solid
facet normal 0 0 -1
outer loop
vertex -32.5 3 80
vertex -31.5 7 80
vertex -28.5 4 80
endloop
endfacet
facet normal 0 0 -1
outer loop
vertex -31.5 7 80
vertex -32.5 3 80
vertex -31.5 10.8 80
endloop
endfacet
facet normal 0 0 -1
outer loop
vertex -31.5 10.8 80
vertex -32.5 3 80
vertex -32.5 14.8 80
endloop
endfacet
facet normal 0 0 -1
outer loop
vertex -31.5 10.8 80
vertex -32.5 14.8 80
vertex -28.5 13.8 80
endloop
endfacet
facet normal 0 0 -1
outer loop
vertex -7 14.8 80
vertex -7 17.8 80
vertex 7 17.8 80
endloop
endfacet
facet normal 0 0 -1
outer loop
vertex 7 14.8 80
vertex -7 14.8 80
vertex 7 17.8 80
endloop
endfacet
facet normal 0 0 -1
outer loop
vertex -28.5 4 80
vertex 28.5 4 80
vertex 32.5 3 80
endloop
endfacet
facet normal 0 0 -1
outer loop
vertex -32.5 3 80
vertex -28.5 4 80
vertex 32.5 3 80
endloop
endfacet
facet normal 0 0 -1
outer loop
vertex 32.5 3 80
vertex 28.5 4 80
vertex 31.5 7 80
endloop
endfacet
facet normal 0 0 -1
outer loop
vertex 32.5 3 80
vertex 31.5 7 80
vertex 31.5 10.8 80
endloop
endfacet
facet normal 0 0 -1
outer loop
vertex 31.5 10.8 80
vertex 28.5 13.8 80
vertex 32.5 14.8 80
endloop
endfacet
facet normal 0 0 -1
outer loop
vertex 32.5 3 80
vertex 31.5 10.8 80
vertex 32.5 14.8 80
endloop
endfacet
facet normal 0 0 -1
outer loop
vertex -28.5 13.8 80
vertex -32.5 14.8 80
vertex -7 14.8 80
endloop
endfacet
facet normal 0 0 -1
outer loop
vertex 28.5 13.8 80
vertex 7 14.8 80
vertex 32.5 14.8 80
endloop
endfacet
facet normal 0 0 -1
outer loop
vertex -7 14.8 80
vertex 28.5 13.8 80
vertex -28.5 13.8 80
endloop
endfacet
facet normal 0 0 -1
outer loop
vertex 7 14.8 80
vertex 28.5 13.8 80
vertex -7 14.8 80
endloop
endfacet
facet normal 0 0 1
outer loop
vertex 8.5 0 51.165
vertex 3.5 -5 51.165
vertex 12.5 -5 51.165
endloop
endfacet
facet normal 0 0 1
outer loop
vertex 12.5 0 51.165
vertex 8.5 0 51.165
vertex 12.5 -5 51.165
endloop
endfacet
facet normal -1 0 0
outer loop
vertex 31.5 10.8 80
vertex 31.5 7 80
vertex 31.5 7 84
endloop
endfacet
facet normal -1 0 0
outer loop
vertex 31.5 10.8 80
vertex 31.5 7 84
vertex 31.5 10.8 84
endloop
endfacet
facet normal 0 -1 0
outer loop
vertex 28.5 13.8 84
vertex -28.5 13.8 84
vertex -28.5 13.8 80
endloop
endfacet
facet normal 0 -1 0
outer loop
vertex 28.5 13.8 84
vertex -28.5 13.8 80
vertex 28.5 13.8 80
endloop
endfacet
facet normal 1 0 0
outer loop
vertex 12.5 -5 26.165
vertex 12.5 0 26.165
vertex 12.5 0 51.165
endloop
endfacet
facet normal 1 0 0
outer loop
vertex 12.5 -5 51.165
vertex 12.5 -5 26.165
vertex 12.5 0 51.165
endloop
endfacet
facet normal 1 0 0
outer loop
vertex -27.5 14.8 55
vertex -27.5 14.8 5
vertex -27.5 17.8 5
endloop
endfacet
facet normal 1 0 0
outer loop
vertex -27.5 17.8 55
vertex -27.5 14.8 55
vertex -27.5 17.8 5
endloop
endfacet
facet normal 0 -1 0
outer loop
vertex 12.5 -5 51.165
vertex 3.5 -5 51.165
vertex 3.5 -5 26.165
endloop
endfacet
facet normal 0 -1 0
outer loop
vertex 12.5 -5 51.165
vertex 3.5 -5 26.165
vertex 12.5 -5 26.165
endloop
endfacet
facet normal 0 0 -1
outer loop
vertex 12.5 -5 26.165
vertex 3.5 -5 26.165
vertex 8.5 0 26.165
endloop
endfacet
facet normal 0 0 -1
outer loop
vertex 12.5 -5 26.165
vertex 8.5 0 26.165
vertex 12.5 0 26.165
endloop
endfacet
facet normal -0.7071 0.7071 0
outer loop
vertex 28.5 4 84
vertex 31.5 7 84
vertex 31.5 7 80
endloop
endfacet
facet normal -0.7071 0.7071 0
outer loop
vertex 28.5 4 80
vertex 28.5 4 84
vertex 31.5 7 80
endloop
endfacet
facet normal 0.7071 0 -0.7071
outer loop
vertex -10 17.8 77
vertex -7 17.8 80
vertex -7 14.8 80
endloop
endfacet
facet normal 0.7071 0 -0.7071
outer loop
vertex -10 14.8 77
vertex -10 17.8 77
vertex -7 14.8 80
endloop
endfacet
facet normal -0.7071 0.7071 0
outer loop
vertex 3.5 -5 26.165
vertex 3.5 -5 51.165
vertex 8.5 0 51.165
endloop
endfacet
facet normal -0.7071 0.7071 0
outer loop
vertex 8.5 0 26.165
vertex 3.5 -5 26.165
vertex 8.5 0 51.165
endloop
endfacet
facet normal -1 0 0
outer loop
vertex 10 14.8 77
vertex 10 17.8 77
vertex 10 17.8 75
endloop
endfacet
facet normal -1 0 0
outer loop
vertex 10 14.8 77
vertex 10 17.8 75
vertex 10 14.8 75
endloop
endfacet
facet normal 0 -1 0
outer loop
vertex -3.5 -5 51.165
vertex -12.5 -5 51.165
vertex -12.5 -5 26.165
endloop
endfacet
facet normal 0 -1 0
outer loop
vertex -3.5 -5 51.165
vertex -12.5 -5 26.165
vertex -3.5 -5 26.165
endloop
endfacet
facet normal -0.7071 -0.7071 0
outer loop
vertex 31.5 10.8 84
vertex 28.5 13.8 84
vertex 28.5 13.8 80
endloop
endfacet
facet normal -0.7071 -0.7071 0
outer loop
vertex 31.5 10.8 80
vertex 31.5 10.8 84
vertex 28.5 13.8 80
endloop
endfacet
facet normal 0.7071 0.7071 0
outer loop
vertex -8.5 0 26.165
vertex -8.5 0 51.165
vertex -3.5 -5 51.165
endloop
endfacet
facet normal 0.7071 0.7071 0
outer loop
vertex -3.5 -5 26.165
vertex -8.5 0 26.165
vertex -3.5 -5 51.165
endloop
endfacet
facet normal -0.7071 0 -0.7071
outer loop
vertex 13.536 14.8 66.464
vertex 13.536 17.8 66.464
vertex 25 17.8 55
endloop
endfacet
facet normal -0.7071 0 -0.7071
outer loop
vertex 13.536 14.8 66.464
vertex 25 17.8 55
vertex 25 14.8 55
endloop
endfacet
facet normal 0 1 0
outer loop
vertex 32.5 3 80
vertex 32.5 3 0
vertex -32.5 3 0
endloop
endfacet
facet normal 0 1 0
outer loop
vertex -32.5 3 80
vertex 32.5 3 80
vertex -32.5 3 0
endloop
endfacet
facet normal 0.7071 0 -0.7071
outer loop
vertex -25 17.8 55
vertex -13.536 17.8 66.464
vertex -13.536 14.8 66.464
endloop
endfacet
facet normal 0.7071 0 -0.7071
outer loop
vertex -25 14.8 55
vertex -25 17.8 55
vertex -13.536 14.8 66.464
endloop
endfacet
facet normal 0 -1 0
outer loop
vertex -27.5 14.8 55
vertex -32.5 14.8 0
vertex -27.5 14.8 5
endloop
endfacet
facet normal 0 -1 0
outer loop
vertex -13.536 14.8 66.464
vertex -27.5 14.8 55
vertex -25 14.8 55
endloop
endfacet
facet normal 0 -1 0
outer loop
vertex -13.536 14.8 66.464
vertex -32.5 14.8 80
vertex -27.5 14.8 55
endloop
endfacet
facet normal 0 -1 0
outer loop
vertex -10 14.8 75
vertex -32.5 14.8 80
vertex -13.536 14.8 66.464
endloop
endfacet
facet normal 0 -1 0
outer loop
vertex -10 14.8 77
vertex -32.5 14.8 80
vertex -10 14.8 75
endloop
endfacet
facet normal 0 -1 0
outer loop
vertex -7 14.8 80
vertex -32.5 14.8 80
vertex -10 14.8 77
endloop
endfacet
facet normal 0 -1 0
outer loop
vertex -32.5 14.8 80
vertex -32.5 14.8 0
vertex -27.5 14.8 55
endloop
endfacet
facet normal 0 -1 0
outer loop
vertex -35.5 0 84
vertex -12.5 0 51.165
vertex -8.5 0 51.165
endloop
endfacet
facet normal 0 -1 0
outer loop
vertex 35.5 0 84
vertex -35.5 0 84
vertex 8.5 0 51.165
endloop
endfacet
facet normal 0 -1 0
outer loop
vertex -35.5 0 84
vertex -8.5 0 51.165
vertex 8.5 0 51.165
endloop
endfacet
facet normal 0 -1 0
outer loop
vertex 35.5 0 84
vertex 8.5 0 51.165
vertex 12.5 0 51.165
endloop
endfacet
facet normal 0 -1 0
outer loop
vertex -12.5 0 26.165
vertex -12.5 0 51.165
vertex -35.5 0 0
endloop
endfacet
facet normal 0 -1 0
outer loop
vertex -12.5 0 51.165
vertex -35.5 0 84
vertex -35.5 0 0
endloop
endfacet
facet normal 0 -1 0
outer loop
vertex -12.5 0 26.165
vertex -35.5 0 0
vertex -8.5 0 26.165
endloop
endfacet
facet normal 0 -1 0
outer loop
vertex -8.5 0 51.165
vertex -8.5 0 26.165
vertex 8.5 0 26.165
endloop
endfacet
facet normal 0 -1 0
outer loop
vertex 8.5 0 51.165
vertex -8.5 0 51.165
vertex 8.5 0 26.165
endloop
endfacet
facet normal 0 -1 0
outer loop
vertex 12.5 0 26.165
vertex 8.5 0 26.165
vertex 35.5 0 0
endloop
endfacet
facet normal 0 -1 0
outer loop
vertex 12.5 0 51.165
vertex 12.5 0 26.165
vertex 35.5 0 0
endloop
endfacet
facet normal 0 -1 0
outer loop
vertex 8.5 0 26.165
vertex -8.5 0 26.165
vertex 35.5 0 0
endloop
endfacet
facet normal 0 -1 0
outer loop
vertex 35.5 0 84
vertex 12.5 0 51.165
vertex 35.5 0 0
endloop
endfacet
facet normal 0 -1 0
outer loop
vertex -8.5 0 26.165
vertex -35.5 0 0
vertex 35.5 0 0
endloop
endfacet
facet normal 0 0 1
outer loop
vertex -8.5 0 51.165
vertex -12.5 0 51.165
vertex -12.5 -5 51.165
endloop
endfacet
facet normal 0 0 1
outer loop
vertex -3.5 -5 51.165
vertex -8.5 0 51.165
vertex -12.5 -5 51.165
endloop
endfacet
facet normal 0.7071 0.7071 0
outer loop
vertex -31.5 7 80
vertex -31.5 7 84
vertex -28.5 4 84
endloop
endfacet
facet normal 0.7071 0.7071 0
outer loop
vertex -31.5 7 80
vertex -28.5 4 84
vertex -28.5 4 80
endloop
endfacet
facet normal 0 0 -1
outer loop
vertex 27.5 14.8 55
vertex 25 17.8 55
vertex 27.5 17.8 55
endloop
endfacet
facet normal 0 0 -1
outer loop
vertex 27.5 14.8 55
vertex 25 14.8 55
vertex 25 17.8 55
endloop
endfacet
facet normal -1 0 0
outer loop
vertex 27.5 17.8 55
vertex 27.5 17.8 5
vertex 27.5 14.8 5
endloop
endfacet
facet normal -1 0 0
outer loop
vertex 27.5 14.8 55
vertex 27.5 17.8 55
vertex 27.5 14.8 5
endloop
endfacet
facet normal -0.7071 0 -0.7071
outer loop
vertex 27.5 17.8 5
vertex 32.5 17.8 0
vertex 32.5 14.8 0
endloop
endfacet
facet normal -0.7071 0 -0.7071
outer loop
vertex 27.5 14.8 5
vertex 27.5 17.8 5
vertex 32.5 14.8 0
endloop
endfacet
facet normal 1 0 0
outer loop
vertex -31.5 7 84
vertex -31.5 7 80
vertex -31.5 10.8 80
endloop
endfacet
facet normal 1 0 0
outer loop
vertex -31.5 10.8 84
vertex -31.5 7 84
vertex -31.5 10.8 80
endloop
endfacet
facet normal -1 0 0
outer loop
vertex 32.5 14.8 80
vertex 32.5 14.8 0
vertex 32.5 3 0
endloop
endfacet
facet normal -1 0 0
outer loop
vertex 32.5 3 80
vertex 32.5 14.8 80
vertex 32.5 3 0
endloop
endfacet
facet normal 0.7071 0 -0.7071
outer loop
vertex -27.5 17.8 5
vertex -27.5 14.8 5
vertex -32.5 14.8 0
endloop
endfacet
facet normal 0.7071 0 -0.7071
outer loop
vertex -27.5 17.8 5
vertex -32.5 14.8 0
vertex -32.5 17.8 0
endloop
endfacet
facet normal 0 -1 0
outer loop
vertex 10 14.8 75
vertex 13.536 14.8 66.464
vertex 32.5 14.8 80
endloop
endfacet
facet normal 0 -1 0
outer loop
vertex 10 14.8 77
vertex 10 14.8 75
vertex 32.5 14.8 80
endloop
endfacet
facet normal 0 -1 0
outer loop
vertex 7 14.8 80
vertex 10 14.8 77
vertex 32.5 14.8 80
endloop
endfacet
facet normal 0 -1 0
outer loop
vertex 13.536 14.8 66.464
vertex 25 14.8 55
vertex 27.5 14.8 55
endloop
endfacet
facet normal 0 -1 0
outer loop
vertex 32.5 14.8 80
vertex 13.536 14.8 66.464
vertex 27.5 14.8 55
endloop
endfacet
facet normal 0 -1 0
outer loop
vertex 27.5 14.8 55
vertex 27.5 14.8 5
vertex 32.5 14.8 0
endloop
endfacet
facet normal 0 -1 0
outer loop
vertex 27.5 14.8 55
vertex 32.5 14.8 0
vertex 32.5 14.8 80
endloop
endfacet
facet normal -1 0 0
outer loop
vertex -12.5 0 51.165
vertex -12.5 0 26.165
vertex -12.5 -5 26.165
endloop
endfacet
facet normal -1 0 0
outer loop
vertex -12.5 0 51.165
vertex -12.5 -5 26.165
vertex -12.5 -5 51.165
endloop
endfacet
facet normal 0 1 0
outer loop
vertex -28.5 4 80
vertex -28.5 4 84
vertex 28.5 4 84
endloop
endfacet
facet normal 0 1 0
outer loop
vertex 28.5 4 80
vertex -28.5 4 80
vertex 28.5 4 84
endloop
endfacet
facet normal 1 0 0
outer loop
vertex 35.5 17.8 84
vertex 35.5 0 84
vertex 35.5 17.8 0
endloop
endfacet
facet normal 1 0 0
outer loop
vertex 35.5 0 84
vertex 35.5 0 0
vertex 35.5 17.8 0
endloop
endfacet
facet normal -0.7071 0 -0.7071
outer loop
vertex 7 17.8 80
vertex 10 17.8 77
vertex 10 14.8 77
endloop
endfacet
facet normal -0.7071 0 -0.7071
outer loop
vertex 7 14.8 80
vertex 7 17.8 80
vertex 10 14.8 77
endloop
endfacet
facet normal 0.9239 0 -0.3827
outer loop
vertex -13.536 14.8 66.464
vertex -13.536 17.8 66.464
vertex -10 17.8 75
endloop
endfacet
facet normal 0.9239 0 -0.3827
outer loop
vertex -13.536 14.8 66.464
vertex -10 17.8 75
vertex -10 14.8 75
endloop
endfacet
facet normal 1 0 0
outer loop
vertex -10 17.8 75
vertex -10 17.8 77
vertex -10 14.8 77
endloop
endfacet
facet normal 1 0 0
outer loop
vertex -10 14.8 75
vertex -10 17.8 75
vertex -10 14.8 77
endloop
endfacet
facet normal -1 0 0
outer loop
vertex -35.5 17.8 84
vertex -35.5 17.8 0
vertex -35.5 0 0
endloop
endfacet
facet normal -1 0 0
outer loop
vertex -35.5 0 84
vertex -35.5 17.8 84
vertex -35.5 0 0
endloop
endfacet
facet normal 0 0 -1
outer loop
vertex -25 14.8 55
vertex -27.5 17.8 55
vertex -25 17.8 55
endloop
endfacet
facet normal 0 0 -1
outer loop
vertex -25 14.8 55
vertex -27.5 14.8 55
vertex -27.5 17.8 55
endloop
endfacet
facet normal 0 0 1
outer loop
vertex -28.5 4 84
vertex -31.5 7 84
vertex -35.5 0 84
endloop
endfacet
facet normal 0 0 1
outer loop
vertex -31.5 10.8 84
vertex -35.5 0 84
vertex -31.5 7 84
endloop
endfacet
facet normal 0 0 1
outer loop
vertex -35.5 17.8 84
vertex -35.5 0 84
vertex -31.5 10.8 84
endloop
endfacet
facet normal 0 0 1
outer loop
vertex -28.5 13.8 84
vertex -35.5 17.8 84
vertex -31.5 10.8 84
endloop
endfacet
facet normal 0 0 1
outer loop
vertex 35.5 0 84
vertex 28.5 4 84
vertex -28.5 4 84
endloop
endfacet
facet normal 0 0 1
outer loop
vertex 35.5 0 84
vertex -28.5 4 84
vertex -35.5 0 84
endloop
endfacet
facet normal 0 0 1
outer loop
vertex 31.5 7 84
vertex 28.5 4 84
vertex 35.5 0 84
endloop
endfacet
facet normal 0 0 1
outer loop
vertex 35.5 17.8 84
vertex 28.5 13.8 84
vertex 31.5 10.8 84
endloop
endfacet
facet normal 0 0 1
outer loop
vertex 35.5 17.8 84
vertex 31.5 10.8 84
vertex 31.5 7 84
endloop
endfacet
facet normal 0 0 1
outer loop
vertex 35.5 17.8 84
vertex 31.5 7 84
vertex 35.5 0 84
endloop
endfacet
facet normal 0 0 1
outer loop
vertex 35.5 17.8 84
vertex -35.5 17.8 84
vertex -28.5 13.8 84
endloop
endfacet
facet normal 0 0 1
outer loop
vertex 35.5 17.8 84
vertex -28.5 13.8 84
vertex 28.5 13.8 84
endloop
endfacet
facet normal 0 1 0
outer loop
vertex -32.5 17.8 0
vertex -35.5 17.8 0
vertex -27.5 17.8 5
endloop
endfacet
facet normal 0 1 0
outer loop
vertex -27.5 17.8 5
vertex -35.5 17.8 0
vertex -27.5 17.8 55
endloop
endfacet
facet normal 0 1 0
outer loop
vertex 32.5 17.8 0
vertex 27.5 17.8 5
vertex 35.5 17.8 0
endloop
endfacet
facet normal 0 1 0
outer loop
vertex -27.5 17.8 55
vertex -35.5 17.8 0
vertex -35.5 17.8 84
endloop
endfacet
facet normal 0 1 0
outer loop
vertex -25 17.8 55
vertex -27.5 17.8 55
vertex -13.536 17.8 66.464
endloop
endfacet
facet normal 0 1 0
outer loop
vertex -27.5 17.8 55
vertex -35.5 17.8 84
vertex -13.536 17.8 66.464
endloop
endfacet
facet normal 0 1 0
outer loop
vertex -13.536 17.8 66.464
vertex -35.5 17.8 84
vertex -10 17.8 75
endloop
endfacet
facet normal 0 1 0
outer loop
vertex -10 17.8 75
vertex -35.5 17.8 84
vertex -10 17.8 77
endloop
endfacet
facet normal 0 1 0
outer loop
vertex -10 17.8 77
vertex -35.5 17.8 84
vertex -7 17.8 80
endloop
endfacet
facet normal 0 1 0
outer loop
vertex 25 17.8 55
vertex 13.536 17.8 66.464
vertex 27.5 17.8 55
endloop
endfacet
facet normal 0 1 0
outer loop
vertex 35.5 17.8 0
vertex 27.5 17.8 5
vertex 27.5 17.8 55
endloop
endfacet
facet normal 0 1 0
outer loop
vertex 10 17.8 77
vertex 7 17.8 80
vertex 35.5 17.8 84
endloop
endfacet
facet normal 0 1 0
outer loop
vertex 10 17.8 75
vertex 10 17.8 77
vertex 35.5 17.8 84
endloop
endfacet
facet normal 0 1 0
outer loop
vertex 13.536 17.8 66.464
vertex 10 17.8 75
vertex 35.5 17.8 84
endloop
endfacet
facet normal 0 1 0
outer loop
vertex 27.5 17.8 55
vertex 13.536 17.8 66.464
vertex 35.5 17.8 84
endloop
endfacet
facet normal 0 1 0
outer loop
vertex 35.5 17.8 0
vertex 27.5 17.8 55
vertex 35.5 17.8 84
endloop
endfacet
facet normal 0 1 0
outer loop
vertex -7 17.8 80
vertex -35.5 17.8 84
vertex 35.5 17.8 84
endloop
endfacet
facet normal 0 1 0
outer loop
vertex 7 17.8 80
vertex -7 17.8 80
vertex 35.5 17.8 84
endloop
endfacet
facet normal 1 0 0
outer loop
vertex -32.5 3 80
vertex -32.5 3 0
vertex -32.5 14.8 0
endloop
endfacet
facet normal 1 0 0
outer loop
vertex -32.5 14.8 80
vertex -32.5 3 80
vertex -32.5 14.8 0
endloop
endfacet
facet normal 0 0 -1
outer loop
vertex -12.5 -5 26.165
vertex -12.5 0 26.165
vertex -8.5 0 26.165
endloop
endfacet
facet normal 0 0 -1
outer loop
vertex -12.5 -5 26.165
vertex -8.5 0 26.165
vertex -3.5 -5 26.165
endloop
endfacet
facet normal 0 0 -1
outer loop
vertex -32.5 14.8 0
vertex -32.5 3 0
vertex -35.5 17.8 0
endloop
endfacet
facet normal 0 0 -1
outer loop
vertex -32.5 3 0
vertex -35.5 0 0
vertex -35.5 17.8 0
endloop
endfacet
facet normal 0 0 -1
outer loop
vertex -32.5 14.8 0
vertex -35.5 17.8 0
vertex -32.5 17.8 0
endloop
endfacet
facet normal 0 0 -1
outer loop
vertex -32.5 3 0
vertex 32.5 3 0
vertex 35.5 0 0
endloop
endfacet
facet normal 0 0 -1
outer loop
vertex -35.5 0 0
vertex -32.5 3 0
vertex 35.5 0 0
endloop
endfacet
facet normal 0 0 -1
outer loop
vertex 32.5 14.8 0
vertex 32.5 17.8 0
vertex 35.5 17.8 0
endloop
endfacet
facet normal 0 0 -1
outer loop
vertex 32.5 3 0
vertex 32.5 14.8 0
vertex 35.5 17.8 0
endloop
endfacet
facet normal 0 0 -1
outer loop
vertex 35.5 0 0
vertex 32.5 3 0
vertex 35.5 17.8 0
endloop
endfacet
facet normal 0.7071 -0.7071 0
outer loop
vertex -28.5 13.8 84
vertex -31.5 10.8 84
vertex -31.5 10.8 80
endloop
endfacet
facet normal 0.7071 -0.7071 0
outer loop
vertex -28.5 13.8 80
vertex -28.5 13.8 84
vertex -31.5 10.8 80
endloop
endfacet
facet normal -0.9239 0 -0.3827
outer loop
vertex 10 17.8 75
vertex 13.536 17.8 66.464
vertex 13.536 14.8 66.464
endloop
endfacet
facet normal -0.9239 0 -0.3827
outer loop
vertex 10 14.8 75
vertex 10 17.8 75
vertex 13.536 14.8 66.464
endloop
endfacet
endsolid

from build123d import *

# Parameters (mm, degrees)
F0_W      = 32.5
F0_H      = 3
F1_DEPTH  = 80
F3_DEPTH  = 4
F4_W      = 17.5
F4_H      = 3
F5_DEPTH  = 25
F6_SIZE   = 15
F7_SIZE   = 5
F8_W      = 62.9999996811
F8_H      = 9.7999996811
F9_DEPTH  = 4
F10_SIZE  = 3
F11_SIZE  = 5
F12_W     = 25
F12_H     = 25
F13_DEPTH = 5
F15_DEPTH = 25


with BuildPart() as f1:
    # F0 (on Top) → F1 (new body)
    with BuildSketch(Plane.XY):
        Polygon((-35.5, 0), (-32.5, 0), (-32.5, 3), (-32.5, 14.8), (-35.5, 14.8), align=None)
        Polygon((32.5, 3), (32.5, 0), (35.5, 0), (35.5, 14.8), (32.5, 14.8), align=None)
        with Locations((-16.25, 1.5)):
            Rectangle(F0_W, F0_H)
        with Locations((16.25, 1.5)):
            Rectangle(F0_W, F0_H)
        Polygon((-35.5, 14.8), (-32.5, 14.8), (-27.5, 14.8), (-27.5, 17.8), (-35.5, 17.8), align=None)
        Polygon((27.5, 14.8), (32.5, 14.8), (35.5, 14.8), (35.5, 17.8), (27.5, 17.8), align=None)
    extrude(amount=F1_DEPTH)

    # F2 (on face) → F3 (join)
    with BuildSketch(Plane.XY.offset(80)):
        Polygon((27.5, 17.8), (-27.5, 17.8), (-27.5, 14.8), (-32.5, 14.8), (-32.5, 3), (32.5, 3), (32.5, 14.8), (27.5, 14.8), align=None)
        Polygon((-27.5, 17.8), (-35.5, 17.8), (-35.5, 0), (35.5, 0), (35.5, 17.8), (27.5, 17.8), (27.5, 14.8), (32.5, 14.8), (32.5, 3), (-32.5, 3), (-32.5, 14.8), (-27.5, 14.8), align=None)
    extrude(amount=F3_DEPTH)

    # F4 (on face) → F5 (join)
    with BuildSketch(Plane(origin=(0, 0, 80), x_dir=(1, 0, 0), z_dir=(0, 0, -1))):
        with Locations((-18.75, -16.3)):
            Rectangle(F4_W, F4_H)
        with Locations((18.75, -16.3)):
            Rectangle(F4_W, F4_H)
    extrude(amount=F5_DEPTH)

    # F6
    f6_edges = [f1.edges().sort_by_distance(p)[0] for p in [
        (-10, 16.3, 55),
        (10, 16.3, 55),
    ]]
    chamfer(f6_edges, length=F6_SIZE)

    # F7
    f7_edges = [f1.edges().sort_by_distance(p)[0] for p in [
        (-10, 16.3, 70),
        (10, 16.3, 70),
    ]]
    chamfer(f7_edges, length=F7_SIZE)

    # F8 (on face) → F9 (cut)
    with BuildSketch(Plane.XY.offset(84)):
        with Locations((0, 8.9)):
            Rectangle(F8_W, F8_H)
    extrude(amount=-F9_DEPTH, mode=Mode.SUBTRACT)

    # F10
    f10_edges = [f1.edges().sort_by_distance(p)[0] for p in [
        (-31.5, 13.8, 82),
        (-31.5, 4, 82),
        (31.5, 4, 82),
        (31.5, 13.8, 82),
        (10, 16.3, 80),
        (-10, 16.3, 80),
    ]]
    chamfer(f10_edges, length=F10_SIZE)

    # F11
    f11_edges = [f1.edges().sort_by_distance(p)[0] for p in [
        (-27.5, 16.3, 0),
        (27.5, 16.3, 0),
    ]]
    chamfer(f11_edges, length=F11_SIZE)

    # F12 (on face) → F13 (join)
    with BuildSketch(Plane.XZ):
        with Locations((0, 38.6652871966)):
            Rectangle(F12_W, F12_H)
    extrude(amount=F13_DEPTH)

    # F14 (on face) → F15 (cut)
    with BuildSketch(Plane.XY.offset(51.1652871966)):
        Polygon((8.5, 0), (-8.5, 0), (-3.5, -5), (3.5, -5), align=None)
    extrude(amount=-F15_DEPTH, mode=Mode.SUBTRACT)


solid = f1.part
